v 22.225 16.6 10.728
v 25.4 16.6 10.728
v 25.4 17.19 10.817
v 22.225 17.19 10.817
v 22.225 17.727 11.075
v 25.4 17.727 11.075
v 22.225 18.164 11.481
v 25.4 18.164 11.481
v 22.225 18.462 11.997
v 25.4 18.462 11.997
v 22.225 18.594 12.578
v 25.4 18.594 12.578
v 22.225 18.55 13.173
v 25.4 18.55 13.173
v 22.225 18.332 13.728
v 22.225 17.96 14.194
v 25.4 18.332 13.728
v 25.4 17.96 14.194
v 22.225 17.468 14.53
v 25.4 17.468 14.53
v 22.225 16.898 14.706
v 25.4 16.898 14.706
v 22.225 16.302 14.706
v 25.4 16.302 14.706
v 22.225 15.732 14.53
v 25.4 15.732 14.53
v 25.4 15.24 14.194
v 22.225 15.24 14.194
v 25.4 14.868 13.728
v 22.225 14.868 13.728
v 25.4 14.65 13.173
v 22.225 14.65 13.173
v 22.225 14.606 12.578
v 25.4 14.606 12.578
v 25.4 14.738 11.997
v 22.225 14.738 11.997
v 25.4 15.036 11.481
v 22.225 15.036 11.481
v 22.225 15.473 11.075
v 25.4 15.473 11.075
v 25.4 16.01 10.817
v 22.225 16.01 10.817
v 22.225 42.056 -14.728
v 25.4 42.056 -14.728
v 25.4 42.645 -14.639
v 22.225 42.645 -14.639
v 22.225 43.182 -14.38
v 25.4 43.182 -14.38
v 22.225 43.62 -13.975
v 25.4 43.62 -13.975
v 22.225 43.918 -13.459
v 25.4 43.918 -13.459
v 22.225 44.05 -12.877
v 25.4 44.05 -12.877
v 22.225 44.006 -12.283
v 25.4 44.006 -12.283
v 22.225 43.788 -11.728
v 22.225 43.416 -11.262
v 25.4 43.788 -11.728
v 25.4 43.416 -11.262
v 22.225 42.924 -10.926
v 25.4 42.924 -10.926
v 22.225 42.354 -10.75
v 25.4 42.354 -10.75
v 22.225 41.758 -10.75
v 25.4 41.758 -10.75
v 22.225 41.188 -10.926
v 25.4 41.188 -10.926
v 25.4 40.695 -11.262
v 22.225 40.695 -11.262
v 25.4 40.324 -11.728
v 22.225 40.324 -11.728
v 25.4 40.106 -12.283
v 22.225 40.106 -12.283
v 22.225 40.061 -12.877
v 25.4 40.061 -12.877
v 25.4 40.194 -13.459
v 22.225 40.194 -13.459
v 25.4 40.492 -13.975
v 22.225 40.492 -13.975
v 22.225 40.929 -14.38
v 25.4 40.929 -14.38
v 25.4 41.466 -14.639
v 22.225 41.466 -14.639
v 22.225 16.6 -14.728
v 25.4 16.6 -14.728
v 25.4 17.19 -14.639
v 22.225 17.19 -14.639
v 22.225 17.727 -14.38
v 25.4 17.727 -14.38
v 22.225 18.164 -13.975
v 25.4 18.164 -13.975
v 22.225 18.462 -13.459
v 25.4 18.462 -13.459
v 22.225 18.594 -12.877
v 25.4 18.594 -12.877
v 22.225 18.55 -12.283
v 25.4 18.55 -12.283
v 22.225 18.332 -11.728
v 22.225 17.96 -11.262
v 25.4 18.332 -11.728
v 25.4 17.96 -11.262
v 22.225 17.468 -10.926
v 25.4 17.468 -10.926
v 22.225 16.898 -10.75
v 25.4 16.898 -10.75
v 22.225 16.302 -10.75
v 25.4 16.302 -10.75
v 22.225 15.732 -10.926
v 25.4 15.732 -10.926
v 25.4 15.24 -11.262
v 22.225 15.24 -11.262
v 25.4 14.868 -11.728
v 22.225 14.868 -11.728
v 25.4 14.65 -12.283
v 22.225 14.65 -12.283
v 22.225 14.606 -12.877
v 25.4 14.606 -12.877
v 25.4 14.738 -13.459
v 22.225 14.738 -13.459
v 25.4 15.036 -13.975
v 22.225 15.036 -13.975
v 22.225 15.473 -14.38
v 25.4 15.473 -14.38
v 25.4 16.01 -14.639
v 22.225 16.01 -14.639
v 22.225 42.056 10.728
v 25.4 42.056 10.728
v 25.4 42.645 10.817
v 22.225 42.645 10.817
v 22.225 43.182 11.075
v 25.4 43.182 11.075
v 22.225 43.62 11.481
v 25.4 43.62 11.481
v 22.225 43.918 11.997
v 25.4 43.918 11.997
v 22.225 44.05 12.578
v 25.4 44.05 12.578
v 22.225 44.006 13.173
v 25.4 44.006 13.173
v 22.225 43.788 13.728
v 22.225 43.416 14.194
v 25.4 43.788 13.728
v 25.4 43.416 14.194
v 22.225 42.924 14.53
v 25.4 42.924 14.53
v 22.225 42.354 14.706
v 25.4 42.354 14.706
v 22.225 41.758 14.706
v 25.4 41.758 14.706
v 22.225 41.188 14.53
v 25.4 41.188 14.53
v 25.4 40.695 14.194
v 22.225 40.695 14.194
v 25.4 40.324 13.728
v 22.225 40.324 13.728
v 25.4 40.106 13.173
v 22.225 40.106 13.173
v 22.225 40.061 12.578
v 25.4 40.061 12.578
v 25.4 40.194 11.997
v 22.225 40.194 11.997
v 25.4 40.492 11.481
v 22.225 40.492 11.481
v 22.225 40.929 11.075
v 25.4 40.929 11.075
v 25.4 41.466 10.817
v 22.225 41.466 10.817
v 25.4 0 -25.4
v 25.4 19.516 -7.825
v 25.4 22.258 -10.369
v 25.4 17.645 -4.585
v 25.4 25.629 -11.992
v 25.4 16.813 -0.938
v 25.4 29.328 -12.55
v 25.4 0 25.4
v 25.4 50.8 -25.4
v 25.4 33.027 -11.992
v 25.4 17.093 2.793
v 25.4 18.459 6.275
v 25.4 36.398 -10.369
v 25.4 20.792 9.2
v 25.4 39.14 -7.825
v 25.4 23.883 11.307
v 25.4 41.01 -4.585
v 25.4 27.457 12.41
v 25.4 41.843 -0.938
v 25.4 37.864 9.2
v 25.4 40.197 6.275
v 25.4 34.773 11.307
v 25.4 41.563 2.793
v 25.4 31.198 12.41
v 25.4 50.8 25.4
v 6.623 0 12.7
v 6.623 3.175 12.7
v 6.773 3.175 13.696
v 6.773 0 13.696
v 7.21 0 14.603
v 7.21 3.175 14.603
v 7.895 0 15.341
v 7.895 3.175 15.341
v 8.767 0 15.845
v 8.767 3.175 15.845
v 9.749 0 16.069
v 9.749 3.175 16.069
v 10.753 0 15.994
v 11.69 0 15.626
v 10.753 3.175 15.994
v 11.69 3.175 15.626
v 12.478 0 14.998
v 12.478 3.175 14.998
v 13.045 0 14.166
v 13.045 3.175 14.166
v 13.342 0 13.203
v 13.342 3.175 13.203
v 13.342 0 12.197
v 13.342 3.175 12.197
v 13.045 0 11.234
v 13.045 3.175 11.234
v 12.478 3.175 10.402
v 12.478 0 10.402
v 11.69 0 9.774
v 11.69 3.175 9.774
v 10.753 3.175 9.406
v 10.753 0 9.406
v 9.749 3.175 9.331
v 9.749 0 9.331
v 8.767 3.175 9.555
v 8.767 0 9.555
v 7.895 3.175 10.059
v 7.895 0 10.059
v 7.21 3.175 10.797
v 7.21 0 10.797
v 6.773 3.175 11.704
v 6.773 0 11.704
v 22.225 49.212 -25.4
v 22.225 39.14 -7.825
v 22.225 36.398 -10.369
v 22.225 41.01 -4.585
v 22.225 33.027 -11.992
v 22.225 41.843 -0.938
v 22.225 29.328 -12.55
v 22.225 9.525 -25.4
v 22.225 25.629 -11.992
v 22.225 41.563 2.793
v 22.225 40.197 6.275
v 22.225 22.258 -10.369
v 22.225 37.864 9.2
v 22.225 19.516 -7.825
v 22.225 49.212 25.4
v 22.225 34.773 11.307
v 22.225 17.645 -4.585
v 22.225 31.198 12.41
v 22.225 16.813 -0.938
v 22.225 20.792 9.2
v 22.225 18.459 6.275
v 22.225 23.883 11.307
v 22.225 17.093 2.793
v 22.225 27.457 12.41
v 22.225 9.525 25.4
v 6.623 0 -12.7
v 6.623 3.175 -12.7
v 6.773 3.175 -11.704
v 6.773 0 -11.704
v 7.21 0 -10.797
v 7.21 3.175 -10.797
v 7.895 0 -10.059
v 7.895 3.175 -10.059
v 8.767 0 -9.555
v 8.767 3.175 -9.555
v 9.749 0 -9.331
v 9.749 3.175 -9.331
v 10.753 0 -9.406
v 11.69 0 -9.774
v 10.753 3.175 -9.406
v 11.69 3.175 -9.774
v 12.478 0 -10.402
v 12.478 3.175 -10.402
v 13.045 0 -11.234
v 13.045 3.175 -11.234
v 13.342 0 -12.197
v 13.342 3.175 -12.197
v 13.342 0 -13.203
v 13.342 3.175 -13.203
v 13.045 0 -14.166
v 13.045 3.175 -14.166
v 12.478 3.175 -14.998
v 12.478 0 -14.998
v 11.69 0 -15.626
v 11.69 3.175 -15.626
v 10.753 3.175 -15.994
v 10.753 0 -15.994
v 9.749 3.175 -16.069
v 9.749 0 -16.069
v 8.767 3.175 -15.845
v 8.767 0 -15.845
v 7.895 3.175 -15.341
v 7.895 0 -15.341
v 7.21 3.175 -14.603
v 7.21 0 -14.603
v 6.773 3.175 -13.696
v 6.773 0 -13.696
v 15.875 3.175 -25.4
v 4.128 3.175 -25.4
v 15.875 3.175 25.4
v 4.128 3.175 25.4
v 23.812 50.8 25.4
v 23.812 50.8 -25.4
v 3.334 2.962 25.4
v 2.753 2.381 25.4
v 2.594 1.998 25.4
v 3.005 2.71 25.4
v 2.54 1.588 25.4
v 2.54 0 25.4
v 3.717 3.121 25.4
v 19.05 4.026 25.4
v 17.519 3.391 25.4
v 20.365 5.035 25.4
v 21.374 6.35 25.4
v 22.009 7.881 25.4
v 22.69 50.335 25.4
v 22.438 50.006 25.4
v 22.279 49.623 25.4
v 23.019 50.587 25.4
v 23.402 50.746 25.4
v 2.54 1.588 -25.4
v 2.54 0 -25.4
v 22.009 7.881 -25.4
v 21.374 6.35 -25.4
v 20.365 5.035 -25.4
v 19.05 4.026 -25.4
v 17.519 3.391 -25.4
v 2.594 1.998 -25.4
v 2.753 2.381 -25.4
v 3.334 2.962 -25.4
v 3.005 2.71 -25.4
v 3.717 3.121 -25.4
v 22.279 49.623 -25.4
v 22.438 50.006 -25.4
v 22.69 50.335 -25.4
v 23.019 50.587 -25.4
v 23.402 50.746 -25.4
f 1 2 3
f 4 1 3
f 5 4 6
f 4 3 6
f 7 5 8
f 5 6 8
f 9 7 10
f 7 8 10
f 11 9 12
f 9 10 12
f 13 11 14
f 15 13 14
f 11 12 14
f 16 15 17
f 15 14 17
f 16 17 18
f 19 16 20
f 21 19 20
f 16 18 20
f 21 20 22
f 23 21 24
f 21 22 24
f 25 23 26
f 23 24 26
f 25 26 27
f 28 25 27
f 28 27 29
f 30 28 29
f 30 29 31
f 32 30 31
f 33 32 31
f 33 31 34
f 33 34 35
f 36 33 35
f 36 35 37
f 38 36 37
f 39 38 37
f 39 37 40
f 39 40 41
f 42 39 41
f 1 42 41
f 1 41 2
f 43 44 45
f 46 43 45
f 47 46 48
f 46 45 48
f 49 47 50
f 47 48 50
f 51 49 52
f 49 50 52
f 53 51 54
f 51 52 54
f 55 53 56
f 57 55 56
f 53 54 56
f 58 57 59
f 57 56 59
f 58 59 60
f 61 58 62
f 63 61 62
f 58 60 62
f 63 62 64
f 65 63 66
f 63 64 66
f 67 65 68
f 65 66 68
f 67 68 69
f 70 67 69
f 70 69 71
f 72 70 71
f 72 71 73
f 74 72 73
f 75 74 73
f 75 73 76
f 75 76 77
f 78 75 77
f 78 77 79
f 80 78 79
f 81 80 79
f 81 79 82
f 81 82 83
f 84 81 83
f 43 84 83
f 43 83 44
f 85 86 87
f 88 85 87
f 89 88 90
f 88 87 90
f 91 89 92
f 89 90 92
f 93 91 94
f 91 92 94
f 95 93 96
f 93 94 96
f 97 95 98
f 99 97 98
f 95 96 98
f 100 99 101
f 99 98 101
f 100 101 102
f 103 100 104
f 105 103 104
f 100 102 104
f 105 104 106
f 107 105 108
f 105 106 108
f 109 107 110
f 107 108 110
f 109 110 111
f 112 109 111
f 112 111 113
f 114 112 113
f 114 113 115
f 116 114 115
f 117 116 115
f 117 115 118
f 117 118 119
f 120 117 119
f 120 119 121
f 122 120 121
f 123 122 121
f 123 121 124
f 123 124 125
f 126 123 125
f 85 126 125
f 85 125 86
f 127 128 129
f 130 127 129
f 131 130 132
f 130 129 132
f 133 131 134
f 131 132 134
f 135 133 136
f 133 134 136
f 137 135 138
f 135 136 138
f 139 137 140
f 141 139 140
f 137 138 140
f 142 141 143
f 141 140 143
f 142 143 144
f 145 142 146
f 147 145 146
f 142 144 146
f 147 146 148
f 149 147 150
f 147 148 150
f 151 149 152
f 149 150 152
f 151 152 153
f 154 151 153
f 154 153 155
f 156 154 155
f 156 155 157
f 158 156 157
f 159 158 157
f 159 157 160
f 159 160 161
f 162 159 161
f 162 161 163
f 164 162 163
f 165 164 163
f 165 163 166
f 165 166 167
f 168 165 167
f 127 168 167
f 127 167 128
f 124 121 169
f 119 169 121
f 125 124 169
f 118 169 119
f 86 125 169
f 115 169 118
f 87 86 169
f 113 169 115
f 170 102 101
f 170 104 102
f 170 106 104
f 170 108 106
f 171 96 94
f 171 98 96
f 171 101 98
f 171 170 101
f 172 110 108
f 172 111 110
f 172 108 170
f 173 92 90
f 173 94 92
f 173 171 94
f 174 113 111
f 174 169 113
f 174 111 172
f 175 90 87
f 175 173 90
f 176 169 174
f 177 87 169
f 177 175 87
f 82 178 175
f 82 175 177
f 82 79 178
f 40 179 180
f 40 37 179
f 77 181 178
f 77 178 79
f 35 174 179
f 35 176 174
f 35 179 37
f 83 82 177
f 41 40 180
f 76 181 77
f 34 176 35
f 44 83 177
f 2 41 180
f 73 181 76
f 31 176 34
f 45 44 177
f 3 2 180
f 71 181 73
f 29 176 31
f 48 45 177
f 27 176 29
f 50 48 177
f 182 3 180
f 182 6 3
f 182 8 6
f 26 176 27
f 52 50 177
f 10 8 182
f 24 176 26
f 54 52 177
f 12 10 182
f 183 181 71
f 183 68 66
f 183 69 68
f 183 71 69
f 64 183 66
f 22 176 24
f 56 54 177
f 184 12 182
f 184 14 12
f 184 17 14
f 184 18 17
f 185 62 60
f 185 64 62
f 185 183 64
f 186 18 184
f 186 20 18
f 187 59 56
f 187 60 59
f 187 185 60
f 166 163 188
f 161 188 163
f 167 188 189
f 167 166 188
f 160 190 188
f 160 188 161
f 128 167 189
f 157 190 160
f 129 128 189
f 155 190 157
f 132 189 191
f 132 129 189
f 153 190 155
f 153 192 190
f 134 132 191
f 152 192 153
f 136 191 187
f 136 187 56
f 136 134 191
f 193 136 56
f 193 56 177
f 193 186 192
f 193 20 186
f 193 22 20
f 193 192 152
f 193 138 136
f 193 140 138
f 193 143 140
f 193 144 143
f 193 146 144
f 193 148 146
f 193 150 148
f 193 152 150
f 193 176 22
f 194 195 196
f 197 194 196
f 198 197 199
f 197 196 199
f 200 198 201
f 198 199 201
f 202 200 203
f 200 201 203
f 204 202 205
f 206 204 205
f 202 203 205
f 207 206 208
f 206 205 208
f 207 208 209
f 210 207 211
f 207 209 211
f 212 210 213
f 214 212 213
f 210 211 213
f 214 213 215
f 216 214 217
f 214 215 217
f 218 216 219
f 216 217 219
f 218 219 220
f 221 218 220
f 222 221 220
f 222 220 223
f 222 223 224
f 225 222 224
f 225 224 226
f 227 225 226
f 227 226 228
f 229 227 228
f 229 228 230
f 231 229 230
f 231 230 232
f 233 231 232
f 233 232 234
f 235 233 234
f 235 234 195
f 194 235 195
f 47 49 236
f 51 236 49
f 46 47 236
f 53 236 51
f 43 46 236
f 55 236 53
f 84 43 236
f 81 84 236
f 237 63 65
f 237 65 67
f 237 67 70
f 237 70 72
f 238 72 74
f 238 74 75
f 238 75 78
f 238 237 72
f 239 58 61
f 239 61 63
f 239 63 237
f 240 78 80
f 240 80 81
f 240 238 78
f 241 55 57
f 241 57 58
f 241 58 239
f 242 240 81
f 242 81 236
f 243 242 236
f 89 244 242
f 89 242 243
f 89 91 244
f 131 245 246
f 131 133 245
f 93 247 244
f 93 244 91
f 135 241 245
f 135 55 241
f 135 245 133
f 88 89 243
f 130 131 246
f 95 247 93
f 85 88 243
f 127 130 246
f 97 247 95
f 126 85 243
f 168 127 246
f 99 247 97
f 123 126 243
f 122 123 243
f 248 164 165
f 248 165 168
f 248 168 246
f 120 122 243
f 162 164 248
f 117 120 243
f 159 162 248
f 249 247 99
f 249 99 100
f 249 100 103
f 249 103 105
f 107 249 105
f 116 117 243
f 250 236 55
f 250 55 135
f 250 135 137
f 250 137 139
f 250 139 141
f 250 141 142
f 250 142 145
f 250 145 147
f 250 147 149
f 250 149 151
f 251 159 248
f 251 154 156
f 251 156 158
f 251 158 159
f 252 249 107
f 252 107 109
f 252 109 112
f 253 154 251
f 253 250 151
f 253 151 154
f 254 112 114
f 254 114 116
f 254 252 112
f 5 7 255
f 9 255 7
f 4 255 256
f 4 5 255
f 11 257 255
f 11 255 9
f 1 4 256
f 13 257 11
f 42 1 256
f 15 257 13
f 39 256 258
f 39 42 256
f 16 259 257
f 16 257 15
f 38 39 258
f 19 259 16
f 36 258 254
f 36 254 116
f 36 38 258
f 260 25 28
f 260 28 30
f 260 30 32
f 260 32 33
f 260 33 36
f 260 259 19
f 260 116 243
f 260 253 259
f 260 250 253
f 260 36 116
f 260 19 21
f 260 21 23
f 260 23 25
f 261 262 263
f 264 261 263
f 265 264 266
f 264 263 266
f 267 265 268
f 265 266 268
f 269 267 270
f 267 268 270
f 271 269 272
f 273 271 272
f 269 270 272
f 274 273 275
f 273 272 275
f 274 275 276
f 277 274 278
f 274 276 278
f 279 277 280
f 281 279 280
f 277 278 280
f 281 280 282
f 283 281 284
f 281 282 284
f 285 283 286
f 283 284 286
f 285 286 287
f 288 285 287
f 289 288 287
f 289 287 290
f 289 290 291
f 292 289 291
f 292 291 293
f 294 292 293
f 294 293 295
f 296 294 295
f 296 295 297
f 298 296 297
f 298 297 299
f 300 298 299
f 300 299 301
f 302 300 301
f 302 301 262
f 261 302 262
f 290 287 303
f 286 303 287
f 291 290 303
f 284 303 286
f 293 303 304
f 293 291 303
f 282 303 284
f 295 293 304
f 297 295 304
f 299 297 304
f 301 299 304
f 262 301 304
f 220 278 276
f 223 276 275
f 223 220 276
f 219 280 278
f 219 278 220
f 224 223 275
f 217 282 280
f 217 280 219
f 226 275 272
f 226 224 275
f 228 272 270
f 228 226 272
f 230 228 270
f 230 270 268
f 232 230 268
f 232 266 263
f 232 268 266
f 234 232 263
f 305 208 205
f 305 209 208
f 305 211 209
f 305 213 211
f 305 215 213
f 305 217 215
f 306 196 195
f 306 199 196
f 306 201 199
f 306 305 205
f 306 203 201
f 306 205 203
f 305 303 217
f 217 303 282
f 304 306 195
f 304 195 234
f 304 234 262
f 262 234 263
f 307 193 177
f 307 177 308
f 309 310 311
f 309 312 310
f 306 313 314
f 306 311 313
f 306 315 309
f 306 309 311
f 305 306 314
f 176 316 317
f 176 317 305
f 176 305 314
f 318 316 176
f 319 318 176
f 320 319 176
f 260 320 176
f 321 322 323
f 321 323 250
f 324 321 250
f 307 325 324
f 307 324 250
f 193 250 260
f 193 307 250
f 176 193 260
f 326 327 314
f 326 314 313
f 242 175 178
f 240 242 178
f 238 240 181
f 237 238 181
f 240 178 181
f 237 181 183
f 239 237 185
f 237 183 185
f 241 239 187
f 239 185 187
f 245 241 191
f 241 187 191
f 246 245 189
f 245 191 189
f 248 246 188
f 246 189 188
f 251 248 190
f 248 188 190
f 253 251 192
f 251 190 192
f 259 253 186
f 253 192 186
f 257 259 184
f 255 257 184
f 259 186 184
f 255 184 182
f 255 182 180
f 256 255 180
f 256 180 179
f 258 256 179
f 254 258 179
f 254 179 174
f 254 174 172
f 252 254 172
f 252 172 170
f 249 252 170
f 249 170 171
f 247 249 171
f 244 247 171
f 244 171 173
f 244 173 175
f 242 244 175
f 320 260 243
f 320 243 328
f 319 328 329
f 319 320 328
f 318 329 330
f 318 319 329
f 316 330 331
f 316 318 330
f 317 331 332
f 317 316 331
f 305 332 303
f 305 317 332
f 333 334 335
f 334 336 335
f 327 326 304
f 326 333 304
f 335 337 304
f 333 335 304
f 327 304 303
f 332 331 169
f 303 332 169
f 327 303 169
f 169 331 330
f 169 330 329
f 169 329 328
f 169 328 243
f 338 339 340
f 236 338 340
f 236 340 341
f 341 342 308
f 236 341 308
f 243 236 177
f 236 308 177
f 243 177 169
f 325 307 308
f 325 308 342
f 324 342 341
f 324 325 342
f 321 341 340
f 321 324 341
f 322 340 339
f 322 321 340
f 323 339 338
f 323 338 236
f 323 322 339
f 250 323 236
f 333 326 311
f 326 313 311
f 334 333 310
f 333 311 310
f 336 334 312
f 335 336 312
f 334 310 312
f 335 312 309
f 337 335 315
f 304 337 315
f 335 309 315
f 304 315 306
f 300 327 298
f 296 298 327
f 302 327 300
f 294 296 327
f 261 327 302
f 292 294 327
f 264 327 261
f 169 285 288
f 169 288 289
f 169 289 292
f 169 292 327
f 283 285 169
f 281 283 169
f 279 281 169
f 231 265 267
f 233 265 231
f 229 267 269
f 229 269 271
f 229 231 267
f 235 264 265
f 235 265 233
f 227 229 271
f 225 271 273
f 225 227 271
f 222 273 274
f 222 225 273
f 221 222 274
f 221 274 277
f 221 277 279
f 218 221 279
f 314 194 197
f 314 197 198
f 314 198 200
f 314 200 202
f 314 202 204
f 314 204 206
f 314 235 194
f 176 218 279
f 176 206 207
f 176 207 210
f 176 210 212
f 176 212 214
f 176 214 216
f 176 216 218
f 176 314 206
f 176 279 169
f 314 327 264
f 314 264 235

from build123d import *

# Parameters (mm, degrees)
BOSS_EXTRUDE1_DEPTH = 25.4
SKETCH3_W           = 27.94
SKETCH3_H           = 13.830872484
CUT_EXTRUDE1_DEPTH  = 77.2
FILLET1_R           = 1.5875
SKETCH4_R           = 3.3782
CUT_EXTRUDE2_DEPTH  = 60.652834174
SKETCH5_R           = 2.000000064
SKETCH5_R_2         = 12.55
CUT_EXTRUDE3_DEPTH  = 62.224011629


with BuildPart() as part:
    # Sketch2 → Boss-Extrude1 (new, symmetric)
    with BuildSketch(Plane.XY):
        with BuildLine():
            Line((-25.4, 0), (25.4, 0))
            Line((25.4, 0), (25.4, 50.8))
            Line((25.4, 50.8), (23.8125, 50.8))
            ThreePointArc((23.8125, 50.8), (22.689967985, 50.335032015), (22.225, 49.2125))
            Line((22.225, 49.2125), (22.225, 9.525))
            ThreePointArc((22.225, 9.525), (20.365128061, 5.034871939), (15.875, 3.175))
            Line((15.875, 3.175), (-23.8125, 3.175))
            ThreePointArc((-23.8125, 3.175), (-24.935032015, 2.710032015), (-25.4, 1.5875))
            Line((-25.4, 1.5875), (-25.4, 0))
        make_face()
    extrude(amount=BOSS_EXTRUDE1_DEPTH, both=True)

    # Sketch3 → Cut-Extrude1 (cut, through all)
    with BuildSketch(Plane(origin=(0, 0, -25.4), x_dir=(-1, 0, 0), z_dir=(0, 0, -1))):
        with Locations((11.43, 1.484116331)):
            Rectangle(SKETCH3_W, SKETCH3_H)
    extrude(amount=-CUT_EXTRUDE1_DEPTH, mode=Mode.SUBTRACT)

    # Fillet1
    fillet1_edges = [part.edges().sort_by_distance(p)[0] for p in [
        (2.54, 3.175, 0),
    ]]
    fillet(fillet1_edges, radius=FILLET1_R)

    # Sketch4 → Cut-Extrude2 (cut, through all)
    with BuildSketch(Plane(origin=(0, 3.175, 0), x_dir=(1, 0, 0), z_dir=(0, 1, 0))):
        with Locations(Location((10.00125, 12.7, 0), (0, 0, 180))):
            Circle(SKETCH4_R)
        with Locations(Location((10.00125, -12.7, 0), (0, 0, 180))):
            Circle(SKETCH4_R)
    extrude(amount=-CUT_EXTRUDE2_DEPTH, mode=Mode.SUBTRACT)

    # Sketch5 → Cut-Extrude3 (cut, through all)
    with BuildSketch(Plane(origin=(25.4, 0, 0), x_dir=(0, 0, -1), z_dir=(1, 0, 0))):
        with Locations((12.72792202, 16.6)):
            Circle(SKETCH5_R)
        with Locations((-12.72792202, 16.6)):
            Circle(SKETCH5_R)
        with Locations((-12.72792202, 42.055844039)):
            Circle(SKETCH5_R)
        with Locations((12.72792202, 42.055844039)):
            Circle(SKETCH5_R)
        with Locations((0, 29.32792202)):
            Circle(SKETCH5_R_2)
    extrude(amount=-CUT_EXTRUDE3_DEPTH, mode=Mode.SUBTRACT)


solid = part.part
